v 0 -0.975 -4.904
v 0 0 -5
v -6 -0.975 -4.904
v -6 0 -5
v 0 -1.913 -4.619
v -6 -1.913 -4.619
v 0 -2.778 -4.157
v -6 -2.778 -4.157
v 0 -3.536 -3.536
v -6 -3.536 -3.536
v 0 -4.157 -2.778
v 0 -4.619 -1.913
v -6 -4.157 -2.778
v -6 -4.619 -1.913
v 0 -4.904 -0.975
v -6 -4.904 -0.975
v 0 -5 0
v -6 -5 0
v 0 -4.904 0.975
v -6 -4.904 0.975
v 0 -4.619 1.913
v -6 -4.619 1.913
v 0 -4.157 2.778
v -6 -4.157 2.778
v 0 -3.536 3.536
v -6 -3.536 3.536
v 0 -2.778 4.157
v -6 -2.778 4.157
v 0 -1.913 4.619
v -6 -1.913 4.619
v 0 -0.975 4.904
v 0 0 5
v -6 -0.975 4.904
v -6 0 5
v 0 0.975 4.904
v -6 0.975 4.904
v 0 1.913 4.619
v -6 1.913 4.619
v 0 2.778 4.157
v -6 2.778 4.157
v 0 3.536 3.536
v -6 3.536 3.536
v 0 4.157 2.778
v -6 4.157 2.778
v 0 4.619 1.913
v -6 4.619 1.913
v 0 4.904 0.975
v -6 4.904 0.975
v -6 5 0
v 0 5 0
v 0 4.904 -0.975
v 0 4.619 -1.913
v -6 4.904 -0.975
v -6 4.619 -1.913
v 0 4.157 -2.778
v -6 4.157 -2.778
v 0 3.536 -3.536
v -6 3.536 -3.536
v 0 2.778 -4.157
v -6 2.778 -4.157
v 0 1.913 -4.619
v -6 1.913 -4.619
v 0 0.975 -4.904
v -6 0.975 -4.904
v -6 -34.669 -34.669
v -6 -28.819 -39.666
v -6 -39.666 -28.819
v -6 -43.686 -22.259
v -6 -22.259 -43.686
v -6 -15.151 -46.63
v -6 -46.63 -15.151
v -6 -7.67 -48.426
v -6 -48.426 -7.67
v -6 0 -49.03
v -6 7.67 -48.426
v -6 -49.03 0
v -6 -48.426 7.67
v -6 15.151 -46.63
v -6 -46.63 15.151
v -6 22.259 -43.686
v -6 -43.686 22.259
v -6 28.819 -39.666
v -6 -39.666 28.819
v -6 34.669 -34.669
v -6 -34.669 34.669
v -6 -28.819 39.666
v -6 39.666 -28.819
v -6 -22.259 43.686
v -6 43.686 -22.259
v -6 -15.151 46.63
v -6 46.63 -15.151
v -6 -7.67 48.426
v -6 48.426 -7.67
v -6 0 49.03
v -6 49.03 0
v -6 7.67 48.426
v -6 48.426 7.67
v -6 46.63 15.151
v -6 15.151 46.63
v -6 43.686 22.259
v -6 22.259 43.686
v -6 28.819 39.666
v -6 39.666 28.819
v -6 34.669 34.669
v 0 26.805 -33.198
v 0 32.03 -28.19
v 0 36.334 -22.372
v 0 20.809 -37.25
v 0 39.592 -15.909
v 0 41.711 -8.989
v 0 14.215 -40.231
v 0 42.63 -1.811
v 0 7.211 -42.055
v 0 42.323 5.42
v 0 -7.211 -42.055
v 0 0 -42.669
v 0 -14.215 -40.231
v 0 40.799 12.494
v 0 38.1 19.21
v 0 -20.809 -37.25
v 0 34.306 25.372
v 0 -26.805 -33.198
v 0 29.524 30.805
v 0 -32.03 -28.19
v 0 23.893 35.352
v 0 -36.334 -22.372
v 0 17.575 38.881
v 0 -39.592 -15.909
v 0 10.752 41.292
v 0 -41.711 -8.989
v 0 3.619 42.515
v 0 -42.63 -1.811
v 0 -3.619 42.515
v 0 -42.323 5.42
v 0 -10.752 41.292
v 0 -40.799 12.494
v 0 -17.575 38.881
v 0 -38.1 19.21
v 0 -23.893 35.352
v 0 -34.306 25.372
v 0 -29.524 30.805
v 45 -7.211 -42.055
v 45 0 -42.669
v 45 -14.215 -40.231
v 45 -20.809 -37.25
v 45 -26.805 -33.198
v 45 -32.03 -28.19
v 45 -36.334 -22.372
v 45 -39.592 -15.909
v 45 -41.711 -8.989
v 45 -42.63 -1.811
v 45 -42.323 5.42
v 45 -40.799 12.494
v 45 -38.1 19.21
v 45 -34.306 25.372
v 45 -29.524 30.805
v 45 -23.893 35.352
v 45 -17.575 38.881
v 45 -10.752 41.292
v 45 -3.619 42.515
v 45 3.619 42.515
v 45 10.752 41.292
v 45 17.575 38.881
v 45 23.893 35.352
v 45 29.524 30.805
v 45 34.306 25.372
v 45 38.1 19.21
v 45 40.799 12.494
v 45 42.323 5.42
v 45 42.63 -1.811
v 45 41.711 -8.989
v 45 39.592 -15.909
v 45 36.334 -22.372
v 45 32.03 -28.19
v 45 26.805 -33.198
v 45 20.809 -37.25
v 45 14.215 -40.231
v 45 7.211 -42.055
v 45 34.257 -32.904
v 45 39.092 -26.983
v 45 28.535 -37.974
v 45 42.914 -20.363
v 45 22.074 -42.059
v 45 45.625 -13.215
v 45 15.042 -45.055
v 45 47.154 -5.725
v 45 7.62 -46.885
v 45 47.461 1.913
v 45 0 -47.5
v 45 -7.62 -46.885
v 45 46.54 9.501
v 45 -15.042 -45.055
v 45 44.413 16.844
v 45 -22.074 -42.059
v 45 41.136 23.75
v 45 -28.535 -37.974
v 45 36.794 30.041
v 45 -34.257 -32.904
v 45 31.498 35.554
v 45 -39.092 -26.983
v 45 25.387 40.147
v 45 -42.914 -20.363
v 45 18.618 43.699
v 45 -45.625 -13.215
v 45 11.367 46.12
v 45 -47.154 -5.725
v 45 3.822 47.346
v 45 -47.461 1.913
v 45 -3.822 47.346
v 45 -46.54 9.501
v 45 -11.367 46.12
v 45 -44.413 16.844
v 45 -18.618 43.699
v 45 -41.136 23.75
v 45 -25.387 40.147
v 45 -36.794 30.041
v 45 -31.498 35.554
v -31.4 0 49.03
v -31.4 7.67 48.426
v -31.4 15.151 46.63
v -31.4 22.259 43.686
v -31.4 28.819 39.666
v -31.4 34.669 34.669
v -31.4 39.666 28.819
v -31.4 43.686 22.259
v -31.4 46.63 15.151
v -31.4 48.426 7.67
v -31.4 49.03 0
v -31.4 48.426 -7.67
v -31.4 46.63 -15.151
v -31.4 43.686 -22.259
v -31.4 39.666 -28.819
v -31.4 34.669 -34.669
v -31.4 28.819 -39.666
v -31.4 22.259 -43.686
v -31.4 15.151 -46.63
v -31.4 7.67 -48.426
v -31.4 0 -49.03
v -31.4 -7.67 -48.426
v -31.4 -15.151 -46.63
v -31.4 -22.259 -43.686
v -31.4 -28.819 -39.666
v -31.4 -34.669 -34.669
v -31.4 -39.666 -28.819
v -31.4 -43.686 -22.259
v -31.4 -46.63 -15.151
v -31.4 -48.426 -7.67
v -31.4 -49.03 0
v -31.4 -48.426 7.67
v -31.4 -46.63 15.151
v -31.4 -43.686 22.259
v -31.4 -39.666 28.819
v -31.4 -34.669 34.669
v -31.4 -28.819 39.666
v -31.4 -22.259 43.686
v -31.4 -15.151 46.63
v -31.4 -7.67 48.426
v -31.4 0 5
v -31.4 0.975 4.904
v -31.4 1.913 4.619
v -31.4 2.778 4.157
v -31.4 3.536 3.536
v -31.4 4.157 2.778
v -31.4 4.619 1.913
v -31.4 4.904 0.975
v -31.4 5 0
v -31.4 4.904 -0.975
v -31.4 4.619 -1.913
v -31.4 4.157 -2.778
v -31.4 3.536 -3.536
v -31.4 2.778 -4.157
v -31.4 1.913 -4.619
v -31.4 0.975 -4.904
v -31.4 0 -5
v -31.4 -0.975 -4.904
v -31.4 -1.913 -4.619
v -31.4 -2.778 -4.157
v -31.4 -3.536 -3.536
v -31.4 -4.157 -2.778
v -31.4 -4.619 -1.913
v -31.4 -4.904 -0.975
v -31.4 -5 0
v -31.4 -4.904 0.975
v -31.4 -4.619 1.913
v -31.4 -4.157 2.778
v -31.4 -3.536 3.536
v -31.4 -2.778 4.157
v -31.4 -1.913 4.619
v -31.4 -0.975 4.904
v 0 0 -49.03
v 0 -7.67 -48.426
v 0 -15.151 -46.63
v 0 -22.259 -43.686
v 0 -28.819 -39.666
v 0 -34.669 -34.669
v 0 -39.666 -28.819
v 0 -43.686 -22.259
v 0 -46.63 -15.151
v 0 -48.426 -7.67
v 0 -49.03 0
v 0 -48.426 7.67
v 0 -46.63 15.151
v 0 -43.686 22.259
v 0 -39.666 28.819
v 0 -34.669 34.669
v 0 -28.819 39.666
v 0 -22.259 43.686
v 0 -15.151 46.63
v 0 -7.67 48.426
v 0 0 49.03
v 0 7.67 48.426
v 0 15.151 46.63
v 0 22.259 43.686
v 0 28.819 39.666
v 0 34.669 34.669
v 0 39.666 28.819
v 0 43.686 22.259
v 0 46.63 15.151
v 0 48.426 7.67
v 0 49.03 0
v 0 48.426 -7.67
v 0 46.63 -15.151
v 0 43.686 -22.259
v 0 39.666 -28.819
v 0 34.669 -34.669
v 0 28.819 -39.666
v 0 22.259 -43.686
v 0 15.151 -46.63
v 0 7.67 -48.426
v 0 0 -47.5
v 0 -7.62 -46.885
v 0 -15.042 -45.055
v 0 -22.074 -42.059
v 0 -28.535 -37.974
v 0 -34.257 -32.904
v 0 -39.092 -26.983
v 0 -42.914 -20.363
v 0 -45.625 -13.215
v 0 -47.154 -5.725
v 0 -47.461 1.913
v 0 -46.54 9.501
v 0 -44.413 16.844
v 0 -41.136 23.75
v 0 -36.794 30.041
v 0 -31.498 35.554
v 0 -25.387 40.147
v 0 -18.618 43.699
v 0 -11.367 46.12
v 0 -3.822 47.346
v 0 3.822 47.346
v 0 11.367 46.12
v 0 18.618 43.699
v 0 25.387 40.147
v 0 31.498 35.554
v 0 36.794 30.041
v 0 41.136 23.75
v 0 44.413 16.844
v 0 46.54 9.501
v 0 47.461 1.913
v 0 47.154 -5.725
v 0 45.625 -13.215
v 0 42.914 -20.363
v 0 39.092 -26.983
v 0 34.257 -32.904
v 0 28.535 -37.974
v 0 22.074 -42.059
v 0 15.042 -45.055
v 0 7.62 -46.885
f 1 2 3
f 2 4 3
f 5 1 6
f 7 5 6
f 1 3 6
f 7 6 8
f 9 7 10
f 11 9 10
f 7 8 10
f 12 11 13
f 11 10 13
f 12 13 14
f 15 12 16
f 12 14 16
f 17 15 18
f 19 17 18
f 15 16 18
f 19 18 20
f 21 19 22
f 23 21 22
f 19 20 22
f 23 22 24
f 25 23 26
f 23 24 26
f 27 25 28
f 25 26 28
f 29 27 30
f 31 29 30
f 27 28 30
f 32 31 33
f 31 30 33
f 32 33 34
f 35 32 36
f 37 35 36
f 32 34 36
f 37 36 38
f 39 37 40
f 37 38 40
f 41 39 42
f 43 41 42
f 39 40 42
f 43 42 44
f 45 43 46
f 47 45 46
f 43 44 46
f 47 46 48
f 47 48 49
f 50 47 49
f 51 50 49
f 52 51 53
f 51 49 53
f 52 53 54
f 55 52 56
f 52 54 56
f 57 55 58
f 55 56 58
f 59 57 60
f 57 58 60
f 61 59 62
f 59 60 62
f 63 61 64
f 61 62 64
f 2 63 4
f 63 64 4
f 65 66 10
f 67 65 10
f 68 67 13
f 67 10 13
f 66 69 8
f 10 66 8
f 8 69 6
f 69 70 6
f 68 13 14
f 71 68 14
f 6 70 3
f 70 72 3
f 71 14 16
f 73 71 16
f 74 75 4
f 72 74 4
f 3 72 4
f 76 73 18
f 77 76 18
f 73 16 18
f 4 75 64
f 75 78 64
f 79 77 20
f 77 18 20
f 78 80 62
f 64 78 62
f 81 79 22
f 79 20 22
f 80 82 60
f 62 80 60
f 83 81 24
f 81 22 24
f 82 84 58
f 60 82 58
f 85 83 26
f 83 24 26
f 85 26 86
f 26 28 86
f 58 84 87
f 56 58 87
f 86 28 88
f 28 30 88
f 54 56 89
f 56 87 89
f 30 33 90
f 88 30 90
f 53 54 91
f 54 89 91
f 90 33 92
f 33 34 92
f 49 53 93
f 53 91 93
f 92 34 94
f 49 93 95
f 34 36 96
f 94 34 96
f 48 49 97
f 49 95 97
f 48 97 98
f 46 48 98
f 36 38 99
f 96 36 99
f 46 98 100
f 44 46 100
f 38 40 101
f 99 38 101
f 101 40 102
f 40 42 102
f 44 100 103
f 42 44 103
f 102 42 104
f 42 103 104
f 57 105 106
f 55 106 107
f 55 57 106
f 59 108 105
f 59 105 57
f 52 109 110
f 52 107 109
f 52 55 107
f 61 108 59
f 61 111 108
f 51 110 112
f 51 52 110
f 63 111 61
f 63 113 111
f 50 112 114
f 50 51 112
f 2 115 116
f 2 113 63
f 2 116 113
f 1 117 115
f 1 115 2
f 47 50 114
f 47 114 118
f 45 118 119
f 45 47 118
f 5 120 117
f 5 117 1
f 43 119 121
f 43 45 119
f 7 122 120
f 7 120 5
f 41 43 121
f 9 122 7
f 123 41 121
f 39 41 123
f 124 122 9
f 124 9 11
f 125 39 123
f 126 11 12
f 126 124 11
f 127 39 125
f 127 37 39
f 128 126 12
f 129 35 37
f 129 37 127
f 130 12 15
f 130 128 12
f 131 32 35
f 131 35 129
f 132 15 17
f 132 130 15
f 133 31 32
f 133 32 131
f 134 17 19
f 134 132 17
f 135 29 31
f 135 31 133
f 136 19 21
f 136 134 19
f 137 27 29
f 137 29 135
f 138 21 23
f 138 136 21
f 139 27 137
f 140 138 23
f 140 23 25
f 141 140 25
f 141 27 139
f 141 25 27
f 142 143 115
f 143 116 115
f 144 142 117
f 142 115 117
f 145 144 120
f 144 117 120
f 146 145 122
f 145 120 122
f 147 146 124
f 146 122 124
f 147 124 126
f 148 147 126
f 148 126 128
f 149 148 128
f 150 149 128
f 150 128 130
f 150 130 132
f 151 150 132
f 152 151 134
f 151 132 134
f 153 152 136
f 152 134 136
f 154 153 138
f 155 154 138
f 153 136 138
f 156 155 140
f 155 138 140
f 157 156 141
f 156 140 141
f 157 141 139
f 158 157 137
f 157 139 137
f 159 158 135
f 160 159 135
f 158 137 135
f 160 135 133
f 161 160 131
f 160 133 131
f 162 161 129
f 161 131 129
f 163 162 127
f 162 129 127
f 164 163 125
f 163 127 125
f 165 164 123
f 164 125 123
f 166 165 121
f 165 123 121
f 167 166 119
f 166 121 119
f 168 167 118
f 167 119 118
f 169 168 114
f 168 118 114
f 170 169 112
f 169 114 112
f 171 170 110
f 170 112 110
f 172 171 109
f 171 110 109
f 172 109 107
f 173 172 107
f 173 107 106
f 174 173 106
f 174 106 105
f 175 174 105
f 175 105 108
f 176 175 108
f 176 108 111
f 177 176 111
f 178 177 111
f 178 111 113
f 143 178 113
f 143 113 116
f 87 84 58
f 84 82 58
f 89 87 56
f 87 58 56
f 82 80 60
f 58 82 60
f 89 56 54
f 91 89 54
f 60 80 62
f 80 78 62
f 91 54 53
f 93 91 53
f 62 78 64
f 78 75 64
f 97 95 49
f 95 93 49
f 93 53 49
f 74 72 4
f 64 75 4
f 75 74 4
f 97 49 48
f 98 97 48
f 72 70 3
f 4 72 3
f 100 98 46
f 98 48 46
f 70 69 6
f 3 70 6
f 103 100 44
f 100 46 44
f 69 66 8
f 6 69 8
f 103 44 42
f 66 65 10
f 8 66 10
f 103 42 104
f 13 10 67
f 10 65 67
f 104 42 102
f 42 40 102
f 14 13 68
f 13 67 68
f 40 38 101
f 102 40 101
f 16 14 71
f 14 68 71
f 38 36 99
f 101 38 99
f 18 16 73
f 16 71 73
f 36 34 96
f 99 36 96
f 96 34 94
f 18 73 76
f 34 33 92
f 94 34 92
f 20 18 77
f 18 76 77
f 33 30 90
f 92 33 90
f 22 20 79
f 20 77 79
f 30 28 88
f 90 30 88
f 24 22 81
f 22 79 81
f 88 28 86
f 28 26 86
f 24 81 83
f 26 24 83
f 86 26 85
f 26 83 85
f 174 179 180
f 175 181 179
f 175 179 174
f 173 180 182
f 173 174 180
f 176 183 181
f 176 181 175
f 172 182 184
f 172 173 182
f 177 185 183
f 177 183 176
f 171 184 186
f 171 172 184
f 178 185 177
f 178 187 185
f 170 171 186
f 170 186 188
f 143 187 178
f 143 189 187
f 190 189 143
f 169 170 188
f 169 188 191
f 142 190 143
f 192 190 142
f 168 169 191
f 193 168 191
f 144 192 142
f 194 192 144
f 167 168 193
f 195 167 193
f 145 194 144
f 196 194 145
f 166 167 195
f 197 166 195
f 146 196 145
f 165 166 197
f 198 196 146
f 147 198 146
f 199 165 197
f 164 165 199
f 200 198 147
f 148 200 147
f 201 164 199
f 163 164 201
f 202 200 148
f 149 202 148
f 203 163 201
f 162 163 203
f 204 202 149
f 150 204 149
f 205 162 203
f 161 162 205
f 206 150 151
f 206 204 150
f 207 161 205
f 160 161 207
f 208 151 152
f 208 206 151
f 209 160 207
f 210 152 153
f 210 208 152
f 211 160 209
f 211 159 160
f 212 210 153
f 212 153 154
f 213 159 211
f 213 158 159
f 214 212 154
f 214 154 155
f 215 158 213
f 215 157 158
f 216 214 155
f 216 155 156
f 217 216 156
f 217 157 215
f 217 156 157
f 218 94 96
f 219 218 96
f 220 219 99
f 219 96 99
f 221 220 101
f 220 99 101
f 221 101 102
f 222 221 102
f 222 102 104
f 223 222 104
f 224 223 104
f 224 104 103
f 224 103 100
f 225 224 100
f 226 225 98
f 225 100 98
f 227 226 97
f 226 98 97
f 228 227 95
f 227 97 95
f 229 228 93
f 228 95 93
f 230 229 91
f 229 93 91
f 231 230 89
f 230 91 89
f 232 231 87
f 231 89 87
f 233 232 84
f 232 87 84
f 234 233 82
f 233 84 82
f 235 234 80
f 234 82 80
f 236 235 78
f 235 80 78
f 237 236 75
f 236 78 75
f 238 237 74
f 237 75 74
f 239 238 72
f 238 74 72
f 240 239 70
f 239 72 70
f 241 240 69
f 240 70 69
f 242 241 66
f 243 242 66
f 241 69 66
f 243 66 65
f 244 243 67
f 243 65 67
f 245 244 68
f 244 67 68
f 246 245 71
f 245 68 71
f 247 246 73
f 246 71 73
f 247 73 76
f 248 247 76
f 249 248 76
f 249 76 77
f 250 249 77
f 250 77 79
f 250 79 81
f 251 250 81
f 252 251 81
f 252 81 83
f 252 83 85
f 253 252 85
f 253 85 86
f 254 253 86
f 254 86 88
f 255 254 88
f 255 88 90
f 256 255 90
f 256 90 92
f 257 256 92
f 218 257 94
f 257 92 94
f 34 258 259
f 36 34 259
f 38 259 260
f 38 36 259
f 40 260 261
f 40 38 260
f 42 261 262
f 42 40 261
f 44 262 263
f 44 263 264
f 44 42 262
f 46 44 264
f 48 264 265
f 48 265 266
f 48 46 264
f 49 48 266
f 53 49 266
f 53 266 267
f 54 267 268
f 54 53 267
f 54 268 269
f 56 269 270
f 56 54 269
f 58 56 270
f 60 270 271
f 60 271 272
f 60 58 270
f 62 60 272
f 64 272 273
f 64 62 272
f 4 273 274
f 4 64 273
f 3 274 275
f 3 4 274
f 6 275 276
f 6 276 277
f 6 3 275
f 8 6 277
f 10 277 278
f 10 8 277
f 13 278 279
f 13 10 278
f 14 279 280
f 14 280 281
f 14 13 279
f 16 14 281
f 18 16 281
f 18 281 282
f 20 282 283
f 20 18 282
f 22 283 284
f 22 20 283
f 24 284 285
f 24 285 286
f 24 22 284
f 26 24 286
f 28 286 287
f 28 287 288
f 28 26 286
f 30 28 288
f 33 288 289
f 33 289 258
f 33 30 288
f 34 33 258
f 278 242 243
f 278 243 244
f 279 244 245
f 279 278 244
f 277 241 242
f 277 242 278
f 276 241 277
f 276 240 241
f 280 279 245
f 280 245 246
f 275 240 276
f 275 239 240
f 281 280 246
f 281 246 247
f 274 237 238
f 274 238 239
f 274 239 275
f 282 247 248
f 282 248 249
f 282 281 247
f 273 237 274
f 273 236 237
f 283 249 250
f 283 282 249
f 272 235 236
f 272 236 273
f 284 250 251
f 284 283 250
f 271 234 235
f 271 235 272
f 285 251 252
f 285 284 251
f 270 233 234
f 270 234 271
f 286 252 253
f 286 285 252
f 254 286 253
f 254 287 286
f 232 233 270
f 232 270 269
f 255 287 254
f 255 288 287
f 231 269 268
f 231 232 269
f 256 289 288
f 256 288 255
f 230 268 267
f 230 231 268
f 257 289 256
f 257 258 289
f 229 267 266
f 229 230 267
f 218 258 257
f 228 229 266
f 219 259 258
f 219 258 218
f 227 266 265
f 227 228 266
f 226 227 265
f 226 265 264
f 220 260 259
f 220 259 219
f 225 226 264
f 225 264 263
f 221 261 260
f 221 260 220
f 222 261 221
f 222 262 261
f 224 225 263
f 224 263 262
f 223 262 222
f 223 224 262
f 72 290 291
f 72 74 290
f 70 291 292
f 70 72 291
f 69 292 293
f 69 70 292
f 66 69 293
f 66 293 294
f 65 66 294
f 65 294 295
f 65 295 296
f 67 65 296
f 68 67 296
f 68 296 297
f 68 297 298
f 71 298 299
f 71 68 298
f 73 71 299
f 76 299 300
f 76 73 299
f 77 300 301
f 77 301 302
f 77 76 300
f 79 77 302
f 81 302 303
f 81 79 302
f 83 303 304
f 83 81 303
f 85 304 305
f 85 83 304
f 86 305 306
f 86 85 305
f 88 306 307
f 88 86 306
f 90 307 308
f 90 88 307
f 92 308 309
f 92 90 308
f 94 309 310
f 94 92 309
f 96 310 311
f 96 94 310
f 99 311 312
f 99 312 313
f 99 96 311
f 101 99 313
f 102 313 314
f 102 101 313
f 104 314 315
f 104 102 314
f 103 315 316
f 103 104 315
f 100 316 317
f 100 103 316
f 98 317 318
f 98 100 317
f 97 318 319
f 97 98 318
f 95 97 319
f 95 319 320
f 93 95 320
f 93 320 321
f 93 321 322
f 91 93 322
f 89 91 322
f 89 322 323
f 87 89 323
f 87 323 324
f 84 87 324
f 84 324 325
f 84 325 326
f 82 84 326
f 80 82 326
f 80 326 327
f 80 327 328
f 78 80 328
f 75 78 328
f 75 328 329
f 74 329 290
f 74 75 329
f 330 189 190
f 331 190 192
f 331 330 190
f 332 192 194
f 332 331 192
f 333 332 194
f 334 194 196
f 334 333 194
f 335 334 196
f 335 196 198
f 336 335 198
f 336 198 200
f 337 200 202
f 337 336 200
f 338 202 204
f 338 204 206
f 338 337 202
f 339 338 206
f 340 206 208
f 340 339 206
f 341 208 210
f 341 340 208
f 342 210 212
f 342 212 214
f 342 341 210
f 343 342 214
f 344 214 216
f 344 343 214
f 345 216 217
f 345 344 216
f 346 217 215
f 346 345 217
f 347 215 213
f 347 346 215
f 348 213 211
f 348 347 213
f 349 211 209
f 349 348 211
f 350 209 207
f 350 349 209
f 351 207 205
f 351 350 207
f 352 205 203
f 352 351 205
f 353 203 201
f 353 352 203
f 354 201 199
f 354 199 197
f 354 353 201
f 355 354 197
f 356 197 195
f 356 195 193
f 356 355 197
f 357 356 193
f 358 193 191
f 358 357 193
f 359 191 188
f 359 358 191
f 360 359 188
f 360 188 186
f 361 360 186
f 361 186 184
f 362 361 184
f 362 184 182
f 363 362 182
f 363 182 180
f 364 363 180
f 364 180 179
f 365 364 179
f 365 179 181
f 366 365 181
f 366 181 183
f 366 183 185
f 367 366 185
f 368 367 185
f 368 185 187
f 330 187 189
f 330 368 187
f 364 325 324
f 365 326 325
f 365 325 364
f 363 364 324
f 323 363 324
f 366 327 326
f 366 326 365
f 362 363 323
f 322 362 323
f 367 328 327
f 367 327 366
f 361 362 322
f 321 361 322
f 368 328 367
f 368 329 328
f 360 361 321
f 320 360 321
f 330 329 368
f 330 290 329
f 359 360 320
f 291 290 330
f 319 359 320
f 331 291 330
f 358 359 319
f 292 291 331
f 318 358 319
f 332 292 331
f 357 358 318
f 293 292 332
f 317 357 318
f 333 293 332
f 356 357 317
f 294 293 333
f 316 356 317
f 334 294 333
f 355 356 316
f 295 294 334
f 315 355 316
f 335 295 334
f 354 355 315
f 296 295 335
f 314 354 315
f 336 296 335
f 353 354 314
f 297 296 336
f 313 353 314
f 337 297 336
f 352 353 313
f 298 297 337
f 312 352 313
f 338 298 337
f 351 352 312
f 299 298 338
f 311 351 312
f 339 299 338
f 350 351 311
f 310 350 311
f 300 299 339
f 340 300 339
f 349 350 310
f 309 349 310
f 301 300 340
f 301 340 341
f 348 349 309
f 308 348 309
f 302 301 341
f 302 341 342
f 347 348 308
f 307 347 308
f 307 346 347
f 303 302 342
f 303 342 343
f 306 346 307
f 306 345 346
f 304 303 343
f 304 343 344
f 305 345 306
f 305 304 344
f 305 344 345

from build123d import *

# Parameters (mm, degrees)
SKETCH1_W           = 44.03
SKETCH1_H           = 6
SKETCH1_W_2         = 4.831168831
SKETCH1_H_2         = 45
SKETCH2_R           = 49.03
SKETCH2_R_2         = 5
BOSS_EXTRUDE1_DEPTH = 25.4


with BuildPart() as part:
    # Sketch1 → Revolve1 (revolve)
    with BuildSketch(Plane(origin=(0, 0, 0), x_dir=(0, 1, 0), z_dir=(0, 0, 1)), mode=Mode.PRIVATE) as revolve1_sk:
        with Locations((27.015, 3)):
            Rectangle(SKETCH1_W, SKETCH1_H)
        with Locations((45.084415585, -22.5)):
            Rectangle(SKETCH1_W_2, SKETCH1_H_2)
    revolve(revolve1_sk.sketch.rotate(Axis((0, 0, 0), (-1, 0, 0)), 90), axis=Axis((0, 0, 0), (-1, 0, 0)))


with BuildPart() as body_2:
    # Sketch2 → Boss-Extrude1 (new body)
    with BuildSketch(Plane(origin=(-6, 0, 0), x_dir=(0, -1, 0), z_dir=(-1, 0, 0))):
        with Locations(Location((0, 0, 0), (0, 0, 90))):
            Circle(SKETCH2_R)
        with Locations(Location((0, 0, 0), (0, 0, 90))):
            Circle(SKETCH2_R_2, mode=Mode.SUBTRACT)
    extrude(amount=BOSS_EXTRUDE1_DEPTH)


solid = Compound([part.part, body_2.part])
